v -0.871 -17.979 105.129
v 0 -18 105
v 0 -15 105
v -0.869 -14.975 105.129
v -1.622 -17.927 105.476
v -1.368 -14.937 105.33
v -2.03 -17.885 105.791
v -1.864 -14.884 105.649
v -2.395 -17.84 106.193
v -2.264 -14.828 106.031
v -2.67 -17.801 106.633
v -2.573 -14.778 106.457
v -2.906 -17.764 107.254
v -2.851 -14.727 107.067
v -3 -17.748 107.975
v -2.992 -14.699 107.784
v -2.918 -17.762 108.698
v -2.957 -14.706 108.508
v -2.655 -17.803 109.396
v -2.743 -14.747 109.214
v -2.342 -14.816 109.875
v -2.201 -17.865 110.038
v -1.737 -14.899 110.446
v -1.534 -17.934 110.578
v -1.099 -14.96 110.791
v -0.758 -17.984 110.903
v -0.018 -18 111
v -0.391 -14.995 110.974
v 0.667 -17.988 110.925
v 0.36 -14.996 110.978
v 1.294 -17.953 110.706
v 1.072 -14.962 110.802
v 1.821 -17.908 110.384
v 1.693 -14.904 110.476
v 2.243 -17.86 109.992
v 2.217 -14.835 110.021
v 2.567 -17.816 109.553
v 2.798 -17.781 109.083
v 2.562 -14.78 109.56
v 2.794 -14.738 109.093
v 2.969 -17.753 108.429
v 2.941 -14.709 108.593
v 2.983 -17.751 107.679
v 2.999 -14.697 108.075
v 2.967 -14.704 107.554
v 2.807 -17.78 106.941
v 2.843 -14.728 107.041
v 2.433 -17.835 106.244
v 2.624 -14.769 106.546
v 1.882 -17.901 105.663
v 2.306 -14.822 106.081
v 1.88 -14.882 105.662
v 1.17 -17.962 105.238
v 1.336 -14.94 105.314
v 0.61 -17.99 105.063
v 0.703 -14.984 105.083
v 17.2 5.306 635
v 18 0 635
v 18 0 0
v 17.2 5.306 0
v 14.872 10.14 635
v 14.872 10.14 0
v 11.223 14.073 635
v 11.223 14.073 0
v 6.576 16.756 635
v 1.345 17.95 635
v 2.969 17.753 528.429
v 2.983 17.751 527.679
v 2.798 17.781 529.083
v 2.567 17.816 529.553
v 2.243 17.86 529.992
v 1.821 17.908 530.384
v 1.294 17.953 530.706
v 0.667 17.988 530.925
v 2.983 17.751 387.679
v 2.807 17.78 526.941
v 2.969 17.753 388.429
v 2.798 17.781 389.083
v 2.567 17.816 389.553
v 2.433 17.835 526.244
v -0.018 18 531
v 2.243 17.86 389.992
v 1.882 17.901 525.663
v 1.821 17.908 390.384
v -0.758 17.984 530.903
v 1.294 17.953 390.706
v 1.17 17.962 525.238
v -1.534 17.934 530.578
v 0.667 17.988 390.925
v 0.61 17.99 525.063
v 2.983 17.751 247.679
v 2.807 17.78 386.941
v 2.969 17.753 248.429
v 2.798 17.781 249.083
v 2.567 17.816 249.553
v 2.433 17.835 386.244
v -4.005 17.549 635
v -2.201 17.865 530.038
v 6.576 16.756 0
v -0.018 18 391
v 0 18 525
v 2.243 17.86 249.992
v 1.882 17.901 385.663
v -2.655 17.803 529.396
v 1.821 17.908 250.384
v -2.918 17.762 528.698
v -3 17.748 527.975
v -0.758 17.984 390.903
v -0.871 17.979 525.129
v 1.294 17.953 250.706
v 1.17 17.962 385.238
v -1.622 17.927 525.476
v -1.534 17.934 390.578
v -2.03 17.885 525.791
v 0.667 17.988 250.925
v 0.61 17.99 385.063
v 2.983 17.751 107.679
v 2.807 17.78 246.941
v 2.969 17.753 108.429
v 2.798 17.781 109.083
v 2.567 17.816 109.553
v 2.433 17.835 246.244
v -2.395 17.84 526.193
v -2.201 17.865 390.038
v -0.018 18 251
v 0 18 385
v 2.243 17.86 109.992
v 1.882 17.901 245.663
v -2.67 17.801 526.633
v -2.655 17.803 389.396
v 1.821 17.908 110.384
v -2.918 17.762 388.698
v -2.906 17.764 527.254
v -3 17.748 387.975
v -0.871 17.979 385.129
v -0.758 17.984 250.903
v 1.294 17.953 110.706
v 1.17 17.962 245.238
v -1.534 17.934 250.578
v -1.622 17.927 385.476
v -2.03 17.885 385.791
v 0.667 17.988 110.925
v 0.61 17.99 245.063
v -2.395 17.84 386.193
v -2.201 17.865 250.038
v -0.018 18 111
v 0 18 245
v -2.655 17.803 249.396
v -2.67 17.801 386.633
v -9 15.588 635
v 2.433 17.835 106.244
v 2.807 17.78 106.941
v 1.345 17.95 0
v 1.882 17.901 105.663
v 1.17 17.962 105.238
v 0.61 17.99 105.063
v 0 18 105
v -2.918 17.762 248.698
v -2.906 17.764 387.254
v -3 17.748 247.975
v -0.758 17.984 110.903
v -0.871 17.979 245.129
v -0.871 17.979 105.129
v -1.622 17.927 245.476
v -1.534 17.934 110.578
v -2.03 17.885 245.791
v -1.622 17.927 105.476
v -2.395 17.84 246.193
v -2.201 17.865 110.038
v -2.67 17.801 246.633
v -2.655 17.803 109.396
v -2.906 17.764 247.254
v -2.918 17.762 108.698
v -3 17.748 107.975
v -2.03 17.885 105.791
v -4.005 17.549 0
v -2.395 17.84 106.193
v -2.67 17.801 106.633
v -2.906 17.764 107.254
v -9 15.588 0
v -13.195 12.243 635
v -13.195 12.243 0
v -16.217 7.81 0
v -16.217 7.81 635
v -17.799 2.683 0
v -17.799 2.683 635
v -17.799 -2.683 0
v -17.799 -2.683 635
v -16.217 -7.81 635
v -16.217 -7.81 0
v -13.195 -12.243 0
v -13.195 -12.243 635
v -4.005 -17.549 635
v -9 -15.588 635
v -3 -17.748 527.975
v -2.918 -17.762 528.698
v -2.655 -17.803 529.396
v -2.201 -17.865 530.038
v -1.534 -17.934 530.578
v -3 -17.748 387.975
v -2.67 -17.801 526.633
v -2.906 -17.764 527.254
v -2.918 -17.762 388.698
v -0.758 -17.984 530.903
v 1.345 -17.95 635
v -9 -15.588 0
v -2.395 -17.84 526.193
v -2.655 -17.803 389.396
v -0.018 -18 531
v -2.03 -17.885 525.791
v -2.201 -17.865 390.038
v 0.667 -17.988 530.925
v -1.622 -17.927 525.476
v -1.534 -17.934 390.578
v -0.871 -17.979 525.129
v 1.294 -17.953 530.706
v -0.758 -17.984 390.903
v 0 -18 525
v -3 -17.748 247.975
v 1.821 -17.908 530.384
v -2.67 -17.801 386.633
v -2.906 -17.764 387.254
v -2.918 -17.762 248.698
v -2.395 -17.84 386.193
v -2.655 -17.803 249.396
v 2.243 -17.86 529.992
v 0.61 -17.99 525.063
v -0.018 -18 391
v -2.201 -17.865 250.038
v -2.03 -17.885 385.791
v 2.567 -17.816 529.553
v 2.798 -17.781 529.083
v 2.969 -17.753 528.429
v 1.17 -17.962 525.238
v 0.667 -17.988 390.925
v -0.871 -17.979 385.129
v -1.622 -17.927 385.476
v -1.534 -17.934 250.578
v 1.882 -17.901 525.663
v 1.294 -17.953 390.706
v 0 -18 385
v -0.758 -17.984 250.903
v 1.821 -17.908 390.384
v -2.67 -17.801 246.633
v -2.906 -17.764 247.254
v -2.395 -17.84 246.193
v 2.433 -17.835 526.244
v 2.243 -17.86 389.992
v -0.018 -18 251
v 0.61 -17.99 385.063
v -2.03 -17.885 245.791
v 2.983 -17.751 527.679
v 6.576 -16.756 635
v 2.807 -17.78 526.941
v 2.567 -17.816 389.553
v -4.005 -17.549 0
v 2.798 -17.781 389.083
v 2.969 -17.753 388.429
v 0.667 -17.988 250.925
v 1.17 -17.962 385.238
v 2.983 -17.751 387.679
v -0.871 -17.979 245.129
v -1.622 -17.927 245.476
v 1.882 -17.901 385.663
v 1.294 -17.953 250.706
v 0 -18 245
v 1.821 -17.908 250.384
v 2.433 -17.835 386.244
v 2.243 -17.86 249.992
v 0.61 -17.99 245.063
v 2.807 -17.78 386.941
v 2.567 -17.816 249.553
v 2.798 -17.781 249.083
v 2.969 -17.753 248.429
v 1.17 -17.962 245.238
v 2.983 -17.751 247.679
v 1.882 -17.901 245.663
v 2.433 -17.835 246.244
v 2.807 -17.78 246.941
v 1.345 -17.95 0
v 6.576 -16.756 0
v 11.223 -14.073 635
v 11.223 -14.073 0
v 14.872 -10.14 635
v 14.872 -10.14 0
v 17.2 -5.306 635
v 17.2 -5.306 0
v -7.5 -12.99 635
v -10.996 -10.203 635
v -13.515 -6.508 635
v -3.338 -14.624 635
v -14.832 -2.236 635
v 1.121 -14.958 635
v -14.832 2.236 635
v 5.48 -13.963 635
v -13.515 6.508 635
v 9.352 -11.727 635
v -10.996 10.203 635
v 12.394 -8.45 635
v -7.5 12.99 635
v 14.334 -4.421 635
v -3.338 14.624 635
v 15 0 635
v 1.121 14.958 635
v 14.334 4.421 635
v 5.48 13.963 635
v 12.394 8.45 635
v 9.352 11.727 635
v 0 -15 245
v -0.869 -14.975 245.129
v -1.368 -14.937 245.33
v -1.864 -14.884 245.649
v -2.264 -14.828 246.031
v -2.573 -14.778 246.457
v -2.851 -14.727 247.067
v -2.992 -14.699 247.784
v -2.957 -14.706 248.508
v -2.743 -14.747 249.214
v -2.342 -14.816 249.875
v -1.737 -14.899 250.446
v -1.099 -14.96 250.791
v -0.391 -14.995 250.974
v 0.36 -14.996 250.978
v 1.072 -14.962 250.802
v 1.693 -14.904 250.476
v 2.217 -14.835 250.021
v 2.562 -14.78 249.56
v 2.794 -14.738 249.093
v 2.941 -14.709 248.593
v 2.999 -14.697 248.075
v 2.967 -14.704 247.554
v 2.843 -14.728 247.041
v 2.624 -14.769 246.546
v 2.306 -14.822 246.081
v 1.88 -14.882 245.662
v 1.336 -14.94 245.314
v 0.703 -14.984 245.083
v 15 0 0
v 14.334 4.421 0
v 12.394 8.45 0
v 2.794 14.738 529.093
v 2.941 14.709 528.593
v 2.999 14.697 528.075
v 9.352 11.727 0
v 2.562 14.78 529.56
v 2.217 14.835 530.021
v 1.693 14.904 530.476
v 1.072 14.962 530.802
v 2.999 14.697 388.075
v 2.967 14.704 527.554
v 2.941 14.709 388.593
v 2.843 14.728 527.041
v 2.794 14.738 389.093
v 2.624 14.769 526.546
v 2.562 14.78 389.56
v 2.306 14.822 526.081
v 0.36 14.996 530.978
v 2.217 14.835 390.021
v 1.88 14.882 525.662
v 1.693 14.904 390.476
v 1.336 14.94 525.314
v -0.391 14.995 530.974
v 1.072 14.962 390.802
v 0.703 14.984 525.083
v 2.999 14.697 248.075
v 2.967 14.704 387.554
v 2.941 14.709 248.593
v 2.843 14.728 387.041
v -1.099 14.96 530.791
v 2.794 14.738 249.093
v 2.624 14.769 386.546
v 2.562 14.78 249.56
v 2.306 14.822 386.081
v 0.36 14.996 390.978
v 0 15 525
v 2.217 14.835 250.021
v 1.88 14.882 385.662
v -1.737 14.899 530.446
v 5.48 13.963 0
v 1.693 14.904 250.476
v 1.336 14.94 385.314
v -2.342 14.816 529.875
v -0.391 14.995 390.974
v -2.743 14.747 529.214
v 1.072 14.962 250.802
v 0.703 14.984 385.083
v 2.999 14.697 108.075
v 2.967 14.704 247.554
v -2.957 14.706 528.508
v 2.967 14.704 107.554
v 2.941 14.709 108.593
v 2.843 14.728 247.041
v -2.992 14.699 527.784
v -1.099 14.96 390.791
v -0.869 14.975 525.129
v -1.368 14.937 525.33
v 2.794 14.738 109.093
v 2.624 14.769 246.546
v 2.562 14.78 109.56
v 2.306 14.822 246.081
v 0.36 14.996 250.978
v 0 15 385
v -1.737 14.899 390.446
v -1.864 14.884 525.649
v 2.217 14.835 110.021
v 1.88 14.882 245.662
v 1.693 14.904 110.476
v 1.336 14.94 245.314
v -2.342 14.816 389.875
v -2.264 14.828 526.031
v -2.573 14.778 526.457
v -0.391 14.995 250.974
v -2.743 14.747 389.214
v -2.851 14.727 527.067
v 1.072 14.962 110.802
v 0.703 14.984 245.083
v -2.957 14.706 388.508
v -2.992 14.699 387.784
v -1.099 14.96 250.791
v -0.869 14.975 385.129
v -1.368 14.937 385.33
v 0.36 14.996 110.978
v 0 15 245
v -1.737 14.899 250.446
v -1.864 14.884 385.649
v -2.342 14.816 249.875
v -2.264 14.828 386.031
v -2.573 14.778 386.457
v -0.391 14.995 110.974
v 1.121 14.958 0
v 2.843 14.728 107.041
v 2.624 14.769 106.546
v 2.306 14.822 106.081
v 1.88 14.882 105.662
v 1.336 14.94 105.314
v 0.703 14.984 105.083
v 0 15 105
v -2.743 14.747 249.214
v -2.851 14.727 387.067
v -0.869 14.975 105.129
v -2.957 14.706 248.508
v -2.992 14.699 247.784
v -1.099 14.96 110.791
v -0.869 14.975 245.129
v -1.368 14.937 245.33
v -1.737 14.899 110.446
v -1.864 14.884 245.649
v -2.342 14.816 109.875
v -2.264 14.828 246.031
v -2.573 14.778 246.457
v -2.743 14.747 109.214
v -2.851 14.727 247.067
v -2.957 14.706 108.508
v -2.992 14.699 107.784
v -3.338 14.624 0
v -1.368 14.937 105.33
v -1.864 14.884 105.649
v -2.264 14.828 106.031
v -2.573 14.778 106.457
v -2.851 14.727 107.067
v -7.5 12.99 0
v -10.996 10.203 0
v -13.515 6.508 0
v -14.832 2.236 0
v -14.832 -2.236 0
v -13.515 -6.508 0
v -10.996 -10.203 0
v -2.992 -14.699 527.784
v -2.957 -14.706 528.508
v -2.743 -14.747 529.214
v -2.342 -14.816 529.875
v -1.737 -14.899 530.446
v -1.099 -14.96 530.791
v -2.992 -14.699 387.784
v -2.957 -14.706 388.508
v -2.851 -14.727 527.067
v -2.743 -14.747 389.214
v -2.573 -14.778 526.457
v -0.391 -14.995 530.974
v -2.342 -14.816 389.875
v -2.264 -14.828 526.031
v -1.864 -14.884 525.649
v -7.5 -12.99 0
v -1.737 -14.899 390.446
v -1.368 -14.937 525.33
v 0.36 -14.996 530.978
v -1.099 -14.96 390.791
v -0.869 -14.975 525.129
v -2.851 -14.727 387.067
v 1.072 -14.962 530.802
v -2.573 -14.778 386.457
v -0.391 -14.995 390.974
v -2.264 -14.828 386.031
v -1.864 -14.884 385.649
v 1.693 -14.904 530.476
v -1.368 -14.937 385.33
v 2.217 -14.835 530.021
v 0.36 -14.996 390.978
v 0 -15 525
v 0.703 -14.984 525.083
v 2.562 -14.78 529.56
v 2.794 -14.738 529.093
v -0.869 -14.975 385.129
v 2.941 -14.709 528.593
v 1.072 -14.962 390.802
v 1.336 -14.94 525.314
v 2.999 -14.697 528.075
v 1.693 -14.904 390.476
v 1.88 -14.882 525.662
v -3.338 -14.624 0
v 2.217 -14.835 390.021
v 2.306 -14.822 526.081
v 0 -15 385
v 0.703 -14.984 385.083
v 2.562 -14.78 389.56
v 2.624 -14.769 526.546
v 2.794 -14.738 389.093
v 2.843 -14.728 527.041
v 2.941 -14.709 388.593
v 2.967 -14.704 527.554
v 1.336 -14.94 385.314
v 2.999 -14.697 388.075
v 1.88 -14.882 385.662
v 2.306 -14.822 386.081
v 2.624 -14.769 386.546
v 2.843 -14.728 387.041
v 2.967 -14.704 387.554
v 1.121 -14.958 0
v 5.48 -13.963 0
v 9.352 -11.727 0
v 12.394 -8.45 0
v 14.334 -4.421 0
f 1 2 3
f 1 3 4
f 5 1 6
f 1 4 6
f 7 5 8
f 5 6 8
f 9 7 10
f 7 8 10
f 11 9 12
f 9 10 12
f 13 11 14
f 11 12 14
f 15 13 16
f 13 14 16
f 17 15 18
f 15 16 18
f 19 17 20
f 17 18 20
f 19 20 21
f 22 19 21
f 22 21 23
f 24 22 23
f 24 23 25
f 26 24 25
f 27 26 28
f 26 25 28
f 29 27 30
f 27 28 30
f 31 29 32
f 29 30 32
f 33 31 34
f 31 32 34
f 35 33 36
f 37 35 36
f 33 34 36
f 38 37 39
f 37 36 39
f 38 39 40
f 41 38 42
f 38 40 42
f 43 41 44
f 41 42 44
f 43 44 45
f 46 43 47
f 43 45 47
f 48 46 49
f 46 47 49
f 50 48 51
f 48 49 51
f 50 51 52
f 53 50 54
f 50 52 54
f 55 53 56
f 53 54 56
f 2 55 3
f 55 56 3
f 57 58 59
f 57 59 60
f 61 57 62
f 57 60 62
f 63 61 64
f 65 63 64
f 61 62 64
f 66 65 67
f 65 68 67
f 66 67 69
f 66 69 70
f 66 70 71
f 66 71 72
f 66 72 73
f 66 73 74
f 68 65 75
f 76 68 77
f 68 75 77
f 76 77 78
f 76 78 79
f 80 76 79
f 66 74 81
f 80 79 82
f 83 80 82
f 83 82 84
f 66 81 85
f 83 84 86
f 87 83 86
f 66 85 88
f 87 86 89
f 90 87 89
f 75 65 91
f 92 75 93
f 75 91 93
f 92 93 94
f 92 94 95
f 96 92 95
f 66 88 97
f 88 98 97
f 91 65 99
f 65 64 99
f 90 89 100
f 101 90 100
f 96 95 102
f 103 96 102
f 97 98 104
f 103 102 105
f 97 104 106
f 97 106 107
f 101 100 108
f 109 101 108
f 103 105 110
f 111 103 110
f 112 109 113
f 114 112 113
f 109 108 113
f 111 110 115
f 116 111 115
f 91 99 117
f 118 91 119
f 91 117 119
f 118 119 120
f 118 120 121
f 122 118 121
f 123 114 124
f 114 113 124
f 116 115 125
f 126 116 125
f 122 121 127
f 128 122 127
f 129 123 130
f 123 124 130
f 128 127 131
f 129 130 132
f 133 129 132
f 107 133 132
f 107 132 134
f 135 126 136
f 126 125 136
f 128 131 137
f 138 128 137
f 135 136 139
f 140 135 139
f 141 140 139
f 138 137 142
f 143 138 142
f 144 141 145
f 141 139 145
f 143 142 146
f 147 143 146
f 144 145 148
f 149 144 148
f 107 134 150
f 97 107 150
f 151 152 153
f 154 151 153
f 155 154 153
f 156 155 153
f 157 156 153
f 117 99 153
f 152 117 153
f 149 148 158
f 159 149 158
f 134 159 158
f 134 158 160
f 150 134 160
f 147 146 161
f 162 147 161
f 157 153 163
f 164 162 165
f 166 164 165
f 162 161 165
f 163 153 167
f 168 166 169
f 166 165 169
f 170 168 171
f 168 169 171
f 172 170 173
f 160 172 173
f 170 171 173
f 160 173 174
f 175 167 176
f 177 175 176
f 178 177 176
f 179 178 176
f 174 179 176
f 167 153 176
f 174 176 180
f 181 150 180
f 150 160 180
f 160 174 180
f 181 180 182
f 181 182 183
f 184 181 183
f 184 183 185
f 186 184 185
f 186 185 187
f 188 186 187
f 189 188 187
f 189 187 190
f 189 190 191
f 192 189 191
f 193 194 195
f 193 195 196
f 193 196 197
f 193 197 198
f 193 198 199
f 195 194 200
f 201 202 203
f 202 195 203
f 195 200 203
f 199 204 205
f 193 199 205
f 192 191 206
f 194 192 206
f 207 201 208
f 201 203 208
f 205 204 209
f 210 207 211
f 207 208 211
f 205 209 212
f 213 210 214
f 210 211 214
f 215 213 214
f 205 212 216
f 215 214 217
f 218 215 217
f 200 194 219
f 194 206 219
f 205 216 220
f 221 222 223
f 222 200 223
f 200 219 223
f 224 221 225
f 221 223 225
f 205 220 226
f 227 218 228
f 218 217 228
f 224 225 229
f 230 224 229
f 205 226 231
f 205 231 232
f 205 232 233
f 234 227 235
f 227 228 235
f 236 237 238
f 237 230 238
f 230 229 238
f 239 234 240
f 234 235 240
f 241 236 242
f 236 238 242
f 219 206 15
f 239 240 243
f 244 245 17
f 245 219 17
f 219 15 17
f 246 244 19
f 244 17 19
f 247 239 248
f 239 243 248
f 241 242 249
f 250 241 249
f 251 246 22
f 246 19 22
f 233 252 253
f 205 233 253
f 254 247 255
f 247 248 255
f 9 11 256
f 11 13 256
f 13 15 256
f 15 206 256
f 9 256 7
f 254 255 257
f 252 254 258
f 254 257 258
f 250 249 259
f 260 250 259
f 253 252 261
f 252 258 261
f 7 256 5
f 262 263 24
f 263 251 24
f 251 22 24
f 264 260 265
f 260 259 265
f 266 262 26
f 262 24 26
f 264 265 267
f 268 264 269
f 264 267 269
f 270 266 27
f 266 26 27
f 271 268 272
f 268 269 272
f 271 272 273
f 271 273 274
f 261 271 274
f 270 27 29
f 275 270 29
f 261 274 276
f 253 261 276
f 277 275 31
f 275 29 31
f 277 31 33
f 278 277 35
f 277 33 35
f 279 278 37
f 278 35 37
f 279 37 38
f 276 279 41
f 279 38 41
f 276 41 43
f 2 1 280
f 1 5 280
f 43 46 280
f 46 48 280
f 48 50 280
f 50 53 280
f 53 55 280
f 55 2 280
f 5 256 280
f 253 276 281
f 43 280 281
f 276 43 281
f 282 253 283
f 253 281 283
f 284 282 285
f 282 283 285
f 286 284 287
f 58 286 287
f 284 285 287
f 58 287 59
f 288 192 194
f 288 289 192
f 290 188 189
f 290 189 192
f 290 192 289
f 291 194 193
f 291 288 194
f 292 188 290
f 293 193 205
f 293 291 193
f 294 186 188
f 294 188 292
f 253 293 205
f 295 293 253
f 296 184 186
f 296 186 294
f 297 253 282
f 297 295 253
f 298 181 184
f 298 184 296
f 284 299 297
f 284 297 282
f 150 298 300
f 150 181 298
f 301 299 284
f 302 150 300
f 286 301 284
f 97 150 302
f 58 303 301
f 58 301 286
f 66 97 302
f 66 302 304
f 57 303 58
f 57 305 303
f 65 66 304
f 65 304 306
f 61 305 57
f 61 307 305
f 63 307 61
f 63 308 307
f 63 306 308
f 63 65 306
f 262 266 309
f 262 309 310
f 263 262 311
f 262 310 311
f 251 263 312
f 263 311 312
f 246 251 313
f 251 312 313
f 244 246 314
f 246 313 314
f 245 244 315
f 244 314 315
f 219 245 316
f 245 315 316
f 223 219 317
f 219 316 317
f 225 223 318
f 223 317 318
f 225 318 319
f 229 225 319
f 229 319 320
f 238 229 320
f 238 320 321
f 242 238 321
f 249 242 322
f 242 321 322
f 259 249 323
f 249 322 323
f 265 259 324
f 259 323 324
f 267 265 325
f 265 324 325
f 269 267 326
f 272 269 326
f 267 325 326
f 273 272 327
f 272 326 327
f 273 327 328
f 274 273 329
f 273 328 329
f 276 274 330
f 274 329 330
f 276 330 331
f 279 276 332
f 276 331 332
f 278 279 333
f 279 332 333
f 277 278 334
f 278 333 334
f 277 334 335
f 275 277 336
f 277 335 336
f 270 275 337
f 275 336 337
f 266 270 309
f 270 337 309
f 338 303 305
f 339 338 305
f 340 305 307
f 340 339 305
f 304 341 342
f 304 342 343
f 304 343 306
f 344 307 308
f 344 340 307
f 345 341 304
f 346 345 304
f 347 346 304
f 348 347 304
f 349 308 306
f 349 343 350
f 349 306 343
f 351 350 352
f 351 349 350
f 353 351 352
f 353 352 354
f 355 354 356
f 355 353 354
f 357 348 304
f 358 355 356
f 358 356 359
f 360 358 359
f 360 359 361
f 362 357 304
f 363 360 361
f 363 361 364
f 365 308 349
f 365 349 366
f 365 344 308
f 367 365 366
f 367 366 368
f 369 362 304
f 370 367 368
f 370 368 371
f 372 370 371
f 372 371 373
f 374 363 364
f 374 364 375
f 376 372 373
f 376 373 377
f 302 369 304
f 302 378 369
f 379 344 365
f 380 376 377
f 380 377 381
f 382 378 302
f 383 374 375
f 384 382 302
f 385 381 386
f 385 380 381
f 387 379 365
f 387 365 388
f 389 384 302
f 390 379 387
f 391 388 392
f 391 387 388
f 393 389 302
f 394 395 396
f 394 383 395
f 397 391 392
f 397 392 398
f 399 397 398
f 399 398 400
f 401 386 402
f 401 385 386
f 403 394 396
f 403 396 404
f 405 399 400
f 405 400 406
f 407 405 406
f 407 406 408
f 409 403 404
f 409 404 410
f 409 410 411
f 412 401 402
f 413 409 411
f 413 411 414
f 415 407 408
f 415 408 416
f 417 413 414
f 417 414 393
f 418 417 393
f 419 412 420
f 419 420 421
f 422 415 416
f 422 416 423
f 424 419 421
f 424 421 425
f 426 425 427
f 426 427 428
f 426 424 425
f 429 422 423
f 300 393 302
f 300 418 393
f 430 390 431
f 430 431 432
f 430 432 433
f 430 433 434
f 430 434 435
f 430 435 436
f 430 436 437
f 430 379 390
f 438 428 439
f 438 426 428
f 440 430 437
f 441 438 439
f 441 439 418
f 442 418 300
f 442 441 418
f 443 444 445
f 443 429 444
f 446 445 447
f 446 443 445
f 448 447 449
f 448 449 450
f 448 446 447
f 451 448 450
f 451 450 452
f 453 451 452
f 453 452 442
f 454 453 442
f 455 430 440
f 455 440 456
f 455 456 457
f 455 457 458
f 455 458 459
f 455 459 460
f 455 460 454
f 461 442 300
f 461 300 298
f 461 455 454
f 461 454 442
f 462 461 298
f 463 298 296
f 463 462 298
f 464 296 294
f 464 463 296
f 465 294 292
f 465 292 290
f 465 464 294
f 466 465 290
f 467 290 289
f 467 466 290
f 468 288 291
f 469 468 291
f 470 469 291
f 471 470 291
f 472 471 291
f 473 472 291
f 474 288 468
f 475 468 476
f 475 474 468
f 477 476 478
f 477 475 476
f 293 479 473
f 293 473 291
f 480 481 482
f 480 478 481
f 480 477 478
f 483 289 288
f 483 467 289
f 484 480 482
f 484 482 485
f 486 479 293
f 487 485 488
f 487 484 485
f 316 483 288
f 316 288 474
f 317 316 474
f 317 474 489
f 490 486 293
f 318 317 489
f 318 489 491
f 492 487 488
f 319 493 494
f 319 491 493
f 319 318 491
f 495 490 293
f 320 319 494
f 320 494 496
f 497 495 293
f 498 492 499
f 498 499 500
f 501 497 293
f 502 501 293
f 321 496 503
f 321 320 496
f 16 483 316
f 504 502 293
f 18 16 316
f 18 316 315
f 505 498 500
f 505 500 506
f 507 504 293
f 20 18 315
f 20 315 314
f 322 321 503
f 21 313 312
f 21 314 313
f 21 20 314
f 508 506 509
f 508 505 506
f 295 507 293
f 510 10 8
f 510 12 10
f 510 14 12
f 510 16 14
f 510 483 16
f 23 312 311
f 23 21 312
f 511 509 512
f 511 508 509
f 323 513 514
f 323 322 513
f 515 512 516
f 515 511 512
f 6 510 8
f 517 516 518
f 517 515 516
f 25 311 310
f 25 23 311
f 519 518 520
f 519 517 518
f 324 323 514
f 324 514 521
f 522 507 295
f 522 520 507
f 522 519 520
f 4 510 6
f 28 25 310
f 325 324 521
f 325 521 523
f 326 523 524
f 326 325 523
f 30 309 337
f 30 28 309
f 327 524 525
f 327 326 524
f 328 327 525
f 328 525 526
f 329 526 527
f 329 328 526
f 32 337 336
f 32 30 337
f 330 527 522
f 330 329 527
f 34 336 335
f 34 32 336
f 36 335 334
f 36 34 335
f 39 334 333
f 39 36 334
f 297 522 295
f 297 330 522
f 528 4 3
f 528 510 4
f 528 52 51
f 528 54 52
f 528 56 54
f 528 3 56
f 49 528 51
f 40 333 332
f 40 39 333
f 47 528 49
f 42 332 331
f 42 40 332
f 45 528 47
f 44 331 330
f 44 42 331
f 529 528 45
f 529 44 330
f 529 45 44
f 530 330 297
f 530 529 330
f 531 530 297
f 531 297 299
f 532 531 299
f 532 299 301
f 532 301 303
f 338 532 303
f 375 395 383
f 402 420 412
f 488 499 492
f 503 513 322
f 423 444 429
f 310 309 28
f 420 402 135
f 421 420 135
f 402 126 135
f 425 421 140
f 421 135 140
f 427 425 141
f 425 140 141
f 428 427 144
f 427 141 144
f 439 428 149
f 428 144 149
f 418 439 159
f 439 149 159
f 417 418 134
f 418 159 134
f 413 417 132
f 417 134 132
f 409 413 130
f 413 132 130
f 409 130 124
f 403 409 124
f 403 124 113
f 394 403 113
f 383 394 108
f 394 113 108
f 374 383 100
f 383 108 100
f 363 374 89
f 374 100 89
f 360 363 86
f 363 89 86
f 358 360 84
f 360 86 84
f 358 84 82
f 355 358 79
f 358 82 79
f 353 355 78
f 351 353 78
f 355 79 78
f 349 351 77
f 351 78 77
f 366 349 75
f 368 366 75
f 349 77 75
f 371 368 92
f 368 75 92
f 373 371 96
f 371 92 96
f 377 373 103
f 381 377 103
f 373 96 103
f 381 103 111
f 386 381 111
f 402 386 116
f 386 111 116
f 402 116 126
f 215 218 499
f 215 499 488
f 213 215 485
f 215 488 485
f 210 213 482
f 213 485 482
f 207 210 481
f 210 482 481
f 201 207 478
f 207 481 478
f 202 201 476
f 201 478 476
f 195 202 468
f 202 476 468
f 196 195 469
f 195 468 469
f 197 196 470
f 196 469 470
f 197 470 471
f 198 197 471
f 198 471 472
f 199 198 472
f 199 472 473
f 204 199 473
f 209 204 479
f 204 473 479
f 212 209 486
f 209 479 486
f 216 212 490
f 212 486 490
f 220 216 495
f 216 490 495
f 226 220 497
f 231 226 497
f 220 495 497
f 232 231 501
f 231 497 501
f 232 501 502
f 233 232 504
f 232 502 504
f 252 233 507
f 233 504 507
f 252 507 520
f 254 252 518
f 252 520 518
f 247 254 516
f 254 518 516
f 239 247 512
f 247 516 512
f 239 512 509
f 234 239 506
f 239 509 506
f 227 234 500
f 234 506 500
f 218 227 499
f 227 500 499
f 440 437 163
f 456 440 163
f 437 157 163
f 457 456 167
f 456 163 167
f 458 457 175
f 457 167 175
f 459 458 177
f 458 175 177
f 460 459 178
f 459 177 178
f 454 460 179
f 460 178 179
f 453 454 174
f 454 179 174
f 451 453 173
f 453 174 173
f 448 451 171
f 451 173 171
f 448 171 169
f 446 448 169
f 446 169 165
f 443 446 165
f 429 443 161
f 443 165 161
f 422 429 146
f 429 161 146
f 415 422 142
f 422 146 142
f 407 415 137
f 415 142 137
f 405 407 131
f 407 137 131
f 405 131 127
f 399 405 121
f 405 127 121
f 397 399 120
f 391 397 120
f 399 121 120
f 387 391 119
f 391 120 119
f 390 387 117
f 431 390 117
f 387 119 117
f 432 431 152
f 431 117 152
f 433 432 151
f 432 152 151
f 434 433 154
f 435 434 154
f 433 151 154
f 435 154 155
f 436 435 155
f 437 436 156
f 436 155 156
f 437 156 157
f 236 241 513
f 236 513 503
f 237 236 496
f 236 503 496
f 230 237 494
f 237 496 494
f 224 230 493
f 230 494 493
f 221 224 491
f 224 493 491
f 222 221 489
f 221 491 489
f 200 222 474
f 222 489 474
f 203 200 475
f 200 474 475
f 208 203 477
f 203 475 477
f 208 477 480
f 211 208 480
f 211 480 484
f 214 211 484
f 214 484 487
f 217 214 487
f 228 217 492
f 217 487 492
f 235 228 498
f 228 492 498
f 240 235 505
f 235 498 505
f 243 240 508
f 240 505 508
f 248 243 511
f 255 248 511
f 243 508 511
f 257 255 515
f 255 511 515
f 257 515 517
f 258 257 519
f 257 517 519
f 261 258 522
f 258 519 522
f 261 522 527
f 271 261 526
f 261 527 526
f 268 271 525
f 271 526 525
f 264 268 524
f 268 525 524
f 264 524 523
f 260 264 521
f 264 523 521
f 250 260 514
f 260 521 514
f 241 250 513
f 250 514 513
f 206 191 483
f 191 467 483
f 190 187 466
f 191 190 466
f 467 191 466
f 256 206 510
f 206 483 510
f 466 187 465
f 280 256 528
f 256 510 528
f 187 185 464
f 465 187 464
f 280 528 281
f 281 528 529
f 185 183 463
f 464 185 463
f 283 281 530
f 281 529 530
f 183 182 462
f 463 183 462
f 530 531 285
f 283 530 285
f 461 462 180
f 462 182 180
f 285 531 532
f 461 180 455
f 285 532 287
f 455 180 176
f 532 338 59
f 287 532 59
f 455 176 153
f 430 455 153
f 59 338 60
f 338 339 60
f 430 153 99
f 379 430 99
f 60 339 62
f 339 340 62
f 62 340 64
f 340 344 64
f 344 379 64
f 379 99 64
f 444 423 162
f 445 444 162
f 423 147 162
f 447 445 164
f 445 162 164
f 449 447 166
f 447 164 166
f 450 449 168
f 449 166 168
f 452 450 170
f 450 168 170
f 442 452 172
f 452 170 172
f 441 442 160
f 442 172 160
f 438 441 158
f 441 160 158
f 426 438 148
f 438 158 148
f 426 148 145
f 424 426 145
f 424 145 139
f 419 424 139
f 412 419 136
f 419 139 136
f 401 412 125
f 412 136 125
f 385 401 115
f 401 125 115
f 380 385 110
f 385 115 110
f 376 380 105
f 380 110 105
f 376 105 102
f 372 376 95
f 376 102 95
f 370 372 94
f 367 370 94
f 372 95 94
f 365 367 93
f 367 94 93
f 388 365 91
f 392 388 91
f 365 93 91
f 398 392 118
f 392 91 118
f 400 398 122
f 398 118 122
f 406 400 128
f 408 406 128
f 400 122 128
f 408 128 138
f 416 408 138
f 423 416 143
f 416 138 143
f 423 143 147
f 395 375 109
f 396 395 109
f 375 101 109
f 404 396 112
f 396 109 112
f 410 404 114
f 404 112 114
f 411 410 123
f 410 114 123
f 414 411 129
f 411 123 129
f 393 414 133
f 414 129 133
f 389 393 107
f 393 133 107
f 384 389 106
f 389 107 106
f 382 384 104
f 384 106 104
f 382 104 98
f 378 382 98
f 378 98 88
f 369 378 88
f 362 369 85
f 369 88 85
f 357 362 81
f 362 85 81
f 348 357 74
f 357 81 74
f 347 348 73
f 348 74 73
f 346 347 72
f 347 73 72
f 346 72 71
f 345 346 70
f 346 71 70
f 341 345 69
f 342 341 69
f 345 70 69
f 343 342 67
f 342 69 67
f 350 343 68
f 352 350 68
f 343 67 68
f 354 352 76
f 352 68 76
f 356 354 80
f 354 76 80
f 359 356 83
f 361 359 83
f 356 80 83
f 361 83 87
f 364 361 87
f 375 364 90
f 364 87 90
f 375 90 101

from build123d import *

# Parameters (mm, degrees)
ESQUISSE1_R                = 18
ESQUISSE1_R_2              = 15
EXTRU_MINCE1_DEPTH         = 635
ESQUISSE2_R                = 3
ENL_V_MAT_EXTRU_1_DEPTH    = 30
R_P_TITION_LIN_AIRE1_COUNT = 4
R_P_TITION_LIN_AIRE1_PITCH = 140


with BuildPart() as part:
    # Esquisse1 → Extru.-Mince1 (new body)
    with BuildSketch(Plane.XY):
        Circle(ESQUISSE1_R)
        Circle(ESQUISSE1_R_2, mode=Mode.SUBTRACT)
    extrude(amount=EXTRU_MINCE1_DEPTH)

    # Esquisse2 → Enlèv. mat.-Extru.1 (cut, symmetric)
    with BuildSketch(Plane(origin=(0, 0, 0), x_dir=(1, 0, 0), z_dir=(0, 1, 0))):
        with Locations((0, -108)):
            Circle(ESQUISSE2_R)
    enl_v_mat_extru_1 = extrude(amount=ENL_V_MAT_EXTRU_1_DEPTH, both=True, mode=Mode.SUBTRACT)

    # Répétition linéaire1: Enlèv. mat.-Extru.1 ×4
    with Locations(*[(0, 0, i * R_P_TITION_LIN_AIRE1_PITCH) for i in range(1, R_P_TITION_LIN_AIRE1_COUNT)]):
        add(enl_v_mat_extru_1, mode=Mode.SUBTRACT)


solid = part.part
